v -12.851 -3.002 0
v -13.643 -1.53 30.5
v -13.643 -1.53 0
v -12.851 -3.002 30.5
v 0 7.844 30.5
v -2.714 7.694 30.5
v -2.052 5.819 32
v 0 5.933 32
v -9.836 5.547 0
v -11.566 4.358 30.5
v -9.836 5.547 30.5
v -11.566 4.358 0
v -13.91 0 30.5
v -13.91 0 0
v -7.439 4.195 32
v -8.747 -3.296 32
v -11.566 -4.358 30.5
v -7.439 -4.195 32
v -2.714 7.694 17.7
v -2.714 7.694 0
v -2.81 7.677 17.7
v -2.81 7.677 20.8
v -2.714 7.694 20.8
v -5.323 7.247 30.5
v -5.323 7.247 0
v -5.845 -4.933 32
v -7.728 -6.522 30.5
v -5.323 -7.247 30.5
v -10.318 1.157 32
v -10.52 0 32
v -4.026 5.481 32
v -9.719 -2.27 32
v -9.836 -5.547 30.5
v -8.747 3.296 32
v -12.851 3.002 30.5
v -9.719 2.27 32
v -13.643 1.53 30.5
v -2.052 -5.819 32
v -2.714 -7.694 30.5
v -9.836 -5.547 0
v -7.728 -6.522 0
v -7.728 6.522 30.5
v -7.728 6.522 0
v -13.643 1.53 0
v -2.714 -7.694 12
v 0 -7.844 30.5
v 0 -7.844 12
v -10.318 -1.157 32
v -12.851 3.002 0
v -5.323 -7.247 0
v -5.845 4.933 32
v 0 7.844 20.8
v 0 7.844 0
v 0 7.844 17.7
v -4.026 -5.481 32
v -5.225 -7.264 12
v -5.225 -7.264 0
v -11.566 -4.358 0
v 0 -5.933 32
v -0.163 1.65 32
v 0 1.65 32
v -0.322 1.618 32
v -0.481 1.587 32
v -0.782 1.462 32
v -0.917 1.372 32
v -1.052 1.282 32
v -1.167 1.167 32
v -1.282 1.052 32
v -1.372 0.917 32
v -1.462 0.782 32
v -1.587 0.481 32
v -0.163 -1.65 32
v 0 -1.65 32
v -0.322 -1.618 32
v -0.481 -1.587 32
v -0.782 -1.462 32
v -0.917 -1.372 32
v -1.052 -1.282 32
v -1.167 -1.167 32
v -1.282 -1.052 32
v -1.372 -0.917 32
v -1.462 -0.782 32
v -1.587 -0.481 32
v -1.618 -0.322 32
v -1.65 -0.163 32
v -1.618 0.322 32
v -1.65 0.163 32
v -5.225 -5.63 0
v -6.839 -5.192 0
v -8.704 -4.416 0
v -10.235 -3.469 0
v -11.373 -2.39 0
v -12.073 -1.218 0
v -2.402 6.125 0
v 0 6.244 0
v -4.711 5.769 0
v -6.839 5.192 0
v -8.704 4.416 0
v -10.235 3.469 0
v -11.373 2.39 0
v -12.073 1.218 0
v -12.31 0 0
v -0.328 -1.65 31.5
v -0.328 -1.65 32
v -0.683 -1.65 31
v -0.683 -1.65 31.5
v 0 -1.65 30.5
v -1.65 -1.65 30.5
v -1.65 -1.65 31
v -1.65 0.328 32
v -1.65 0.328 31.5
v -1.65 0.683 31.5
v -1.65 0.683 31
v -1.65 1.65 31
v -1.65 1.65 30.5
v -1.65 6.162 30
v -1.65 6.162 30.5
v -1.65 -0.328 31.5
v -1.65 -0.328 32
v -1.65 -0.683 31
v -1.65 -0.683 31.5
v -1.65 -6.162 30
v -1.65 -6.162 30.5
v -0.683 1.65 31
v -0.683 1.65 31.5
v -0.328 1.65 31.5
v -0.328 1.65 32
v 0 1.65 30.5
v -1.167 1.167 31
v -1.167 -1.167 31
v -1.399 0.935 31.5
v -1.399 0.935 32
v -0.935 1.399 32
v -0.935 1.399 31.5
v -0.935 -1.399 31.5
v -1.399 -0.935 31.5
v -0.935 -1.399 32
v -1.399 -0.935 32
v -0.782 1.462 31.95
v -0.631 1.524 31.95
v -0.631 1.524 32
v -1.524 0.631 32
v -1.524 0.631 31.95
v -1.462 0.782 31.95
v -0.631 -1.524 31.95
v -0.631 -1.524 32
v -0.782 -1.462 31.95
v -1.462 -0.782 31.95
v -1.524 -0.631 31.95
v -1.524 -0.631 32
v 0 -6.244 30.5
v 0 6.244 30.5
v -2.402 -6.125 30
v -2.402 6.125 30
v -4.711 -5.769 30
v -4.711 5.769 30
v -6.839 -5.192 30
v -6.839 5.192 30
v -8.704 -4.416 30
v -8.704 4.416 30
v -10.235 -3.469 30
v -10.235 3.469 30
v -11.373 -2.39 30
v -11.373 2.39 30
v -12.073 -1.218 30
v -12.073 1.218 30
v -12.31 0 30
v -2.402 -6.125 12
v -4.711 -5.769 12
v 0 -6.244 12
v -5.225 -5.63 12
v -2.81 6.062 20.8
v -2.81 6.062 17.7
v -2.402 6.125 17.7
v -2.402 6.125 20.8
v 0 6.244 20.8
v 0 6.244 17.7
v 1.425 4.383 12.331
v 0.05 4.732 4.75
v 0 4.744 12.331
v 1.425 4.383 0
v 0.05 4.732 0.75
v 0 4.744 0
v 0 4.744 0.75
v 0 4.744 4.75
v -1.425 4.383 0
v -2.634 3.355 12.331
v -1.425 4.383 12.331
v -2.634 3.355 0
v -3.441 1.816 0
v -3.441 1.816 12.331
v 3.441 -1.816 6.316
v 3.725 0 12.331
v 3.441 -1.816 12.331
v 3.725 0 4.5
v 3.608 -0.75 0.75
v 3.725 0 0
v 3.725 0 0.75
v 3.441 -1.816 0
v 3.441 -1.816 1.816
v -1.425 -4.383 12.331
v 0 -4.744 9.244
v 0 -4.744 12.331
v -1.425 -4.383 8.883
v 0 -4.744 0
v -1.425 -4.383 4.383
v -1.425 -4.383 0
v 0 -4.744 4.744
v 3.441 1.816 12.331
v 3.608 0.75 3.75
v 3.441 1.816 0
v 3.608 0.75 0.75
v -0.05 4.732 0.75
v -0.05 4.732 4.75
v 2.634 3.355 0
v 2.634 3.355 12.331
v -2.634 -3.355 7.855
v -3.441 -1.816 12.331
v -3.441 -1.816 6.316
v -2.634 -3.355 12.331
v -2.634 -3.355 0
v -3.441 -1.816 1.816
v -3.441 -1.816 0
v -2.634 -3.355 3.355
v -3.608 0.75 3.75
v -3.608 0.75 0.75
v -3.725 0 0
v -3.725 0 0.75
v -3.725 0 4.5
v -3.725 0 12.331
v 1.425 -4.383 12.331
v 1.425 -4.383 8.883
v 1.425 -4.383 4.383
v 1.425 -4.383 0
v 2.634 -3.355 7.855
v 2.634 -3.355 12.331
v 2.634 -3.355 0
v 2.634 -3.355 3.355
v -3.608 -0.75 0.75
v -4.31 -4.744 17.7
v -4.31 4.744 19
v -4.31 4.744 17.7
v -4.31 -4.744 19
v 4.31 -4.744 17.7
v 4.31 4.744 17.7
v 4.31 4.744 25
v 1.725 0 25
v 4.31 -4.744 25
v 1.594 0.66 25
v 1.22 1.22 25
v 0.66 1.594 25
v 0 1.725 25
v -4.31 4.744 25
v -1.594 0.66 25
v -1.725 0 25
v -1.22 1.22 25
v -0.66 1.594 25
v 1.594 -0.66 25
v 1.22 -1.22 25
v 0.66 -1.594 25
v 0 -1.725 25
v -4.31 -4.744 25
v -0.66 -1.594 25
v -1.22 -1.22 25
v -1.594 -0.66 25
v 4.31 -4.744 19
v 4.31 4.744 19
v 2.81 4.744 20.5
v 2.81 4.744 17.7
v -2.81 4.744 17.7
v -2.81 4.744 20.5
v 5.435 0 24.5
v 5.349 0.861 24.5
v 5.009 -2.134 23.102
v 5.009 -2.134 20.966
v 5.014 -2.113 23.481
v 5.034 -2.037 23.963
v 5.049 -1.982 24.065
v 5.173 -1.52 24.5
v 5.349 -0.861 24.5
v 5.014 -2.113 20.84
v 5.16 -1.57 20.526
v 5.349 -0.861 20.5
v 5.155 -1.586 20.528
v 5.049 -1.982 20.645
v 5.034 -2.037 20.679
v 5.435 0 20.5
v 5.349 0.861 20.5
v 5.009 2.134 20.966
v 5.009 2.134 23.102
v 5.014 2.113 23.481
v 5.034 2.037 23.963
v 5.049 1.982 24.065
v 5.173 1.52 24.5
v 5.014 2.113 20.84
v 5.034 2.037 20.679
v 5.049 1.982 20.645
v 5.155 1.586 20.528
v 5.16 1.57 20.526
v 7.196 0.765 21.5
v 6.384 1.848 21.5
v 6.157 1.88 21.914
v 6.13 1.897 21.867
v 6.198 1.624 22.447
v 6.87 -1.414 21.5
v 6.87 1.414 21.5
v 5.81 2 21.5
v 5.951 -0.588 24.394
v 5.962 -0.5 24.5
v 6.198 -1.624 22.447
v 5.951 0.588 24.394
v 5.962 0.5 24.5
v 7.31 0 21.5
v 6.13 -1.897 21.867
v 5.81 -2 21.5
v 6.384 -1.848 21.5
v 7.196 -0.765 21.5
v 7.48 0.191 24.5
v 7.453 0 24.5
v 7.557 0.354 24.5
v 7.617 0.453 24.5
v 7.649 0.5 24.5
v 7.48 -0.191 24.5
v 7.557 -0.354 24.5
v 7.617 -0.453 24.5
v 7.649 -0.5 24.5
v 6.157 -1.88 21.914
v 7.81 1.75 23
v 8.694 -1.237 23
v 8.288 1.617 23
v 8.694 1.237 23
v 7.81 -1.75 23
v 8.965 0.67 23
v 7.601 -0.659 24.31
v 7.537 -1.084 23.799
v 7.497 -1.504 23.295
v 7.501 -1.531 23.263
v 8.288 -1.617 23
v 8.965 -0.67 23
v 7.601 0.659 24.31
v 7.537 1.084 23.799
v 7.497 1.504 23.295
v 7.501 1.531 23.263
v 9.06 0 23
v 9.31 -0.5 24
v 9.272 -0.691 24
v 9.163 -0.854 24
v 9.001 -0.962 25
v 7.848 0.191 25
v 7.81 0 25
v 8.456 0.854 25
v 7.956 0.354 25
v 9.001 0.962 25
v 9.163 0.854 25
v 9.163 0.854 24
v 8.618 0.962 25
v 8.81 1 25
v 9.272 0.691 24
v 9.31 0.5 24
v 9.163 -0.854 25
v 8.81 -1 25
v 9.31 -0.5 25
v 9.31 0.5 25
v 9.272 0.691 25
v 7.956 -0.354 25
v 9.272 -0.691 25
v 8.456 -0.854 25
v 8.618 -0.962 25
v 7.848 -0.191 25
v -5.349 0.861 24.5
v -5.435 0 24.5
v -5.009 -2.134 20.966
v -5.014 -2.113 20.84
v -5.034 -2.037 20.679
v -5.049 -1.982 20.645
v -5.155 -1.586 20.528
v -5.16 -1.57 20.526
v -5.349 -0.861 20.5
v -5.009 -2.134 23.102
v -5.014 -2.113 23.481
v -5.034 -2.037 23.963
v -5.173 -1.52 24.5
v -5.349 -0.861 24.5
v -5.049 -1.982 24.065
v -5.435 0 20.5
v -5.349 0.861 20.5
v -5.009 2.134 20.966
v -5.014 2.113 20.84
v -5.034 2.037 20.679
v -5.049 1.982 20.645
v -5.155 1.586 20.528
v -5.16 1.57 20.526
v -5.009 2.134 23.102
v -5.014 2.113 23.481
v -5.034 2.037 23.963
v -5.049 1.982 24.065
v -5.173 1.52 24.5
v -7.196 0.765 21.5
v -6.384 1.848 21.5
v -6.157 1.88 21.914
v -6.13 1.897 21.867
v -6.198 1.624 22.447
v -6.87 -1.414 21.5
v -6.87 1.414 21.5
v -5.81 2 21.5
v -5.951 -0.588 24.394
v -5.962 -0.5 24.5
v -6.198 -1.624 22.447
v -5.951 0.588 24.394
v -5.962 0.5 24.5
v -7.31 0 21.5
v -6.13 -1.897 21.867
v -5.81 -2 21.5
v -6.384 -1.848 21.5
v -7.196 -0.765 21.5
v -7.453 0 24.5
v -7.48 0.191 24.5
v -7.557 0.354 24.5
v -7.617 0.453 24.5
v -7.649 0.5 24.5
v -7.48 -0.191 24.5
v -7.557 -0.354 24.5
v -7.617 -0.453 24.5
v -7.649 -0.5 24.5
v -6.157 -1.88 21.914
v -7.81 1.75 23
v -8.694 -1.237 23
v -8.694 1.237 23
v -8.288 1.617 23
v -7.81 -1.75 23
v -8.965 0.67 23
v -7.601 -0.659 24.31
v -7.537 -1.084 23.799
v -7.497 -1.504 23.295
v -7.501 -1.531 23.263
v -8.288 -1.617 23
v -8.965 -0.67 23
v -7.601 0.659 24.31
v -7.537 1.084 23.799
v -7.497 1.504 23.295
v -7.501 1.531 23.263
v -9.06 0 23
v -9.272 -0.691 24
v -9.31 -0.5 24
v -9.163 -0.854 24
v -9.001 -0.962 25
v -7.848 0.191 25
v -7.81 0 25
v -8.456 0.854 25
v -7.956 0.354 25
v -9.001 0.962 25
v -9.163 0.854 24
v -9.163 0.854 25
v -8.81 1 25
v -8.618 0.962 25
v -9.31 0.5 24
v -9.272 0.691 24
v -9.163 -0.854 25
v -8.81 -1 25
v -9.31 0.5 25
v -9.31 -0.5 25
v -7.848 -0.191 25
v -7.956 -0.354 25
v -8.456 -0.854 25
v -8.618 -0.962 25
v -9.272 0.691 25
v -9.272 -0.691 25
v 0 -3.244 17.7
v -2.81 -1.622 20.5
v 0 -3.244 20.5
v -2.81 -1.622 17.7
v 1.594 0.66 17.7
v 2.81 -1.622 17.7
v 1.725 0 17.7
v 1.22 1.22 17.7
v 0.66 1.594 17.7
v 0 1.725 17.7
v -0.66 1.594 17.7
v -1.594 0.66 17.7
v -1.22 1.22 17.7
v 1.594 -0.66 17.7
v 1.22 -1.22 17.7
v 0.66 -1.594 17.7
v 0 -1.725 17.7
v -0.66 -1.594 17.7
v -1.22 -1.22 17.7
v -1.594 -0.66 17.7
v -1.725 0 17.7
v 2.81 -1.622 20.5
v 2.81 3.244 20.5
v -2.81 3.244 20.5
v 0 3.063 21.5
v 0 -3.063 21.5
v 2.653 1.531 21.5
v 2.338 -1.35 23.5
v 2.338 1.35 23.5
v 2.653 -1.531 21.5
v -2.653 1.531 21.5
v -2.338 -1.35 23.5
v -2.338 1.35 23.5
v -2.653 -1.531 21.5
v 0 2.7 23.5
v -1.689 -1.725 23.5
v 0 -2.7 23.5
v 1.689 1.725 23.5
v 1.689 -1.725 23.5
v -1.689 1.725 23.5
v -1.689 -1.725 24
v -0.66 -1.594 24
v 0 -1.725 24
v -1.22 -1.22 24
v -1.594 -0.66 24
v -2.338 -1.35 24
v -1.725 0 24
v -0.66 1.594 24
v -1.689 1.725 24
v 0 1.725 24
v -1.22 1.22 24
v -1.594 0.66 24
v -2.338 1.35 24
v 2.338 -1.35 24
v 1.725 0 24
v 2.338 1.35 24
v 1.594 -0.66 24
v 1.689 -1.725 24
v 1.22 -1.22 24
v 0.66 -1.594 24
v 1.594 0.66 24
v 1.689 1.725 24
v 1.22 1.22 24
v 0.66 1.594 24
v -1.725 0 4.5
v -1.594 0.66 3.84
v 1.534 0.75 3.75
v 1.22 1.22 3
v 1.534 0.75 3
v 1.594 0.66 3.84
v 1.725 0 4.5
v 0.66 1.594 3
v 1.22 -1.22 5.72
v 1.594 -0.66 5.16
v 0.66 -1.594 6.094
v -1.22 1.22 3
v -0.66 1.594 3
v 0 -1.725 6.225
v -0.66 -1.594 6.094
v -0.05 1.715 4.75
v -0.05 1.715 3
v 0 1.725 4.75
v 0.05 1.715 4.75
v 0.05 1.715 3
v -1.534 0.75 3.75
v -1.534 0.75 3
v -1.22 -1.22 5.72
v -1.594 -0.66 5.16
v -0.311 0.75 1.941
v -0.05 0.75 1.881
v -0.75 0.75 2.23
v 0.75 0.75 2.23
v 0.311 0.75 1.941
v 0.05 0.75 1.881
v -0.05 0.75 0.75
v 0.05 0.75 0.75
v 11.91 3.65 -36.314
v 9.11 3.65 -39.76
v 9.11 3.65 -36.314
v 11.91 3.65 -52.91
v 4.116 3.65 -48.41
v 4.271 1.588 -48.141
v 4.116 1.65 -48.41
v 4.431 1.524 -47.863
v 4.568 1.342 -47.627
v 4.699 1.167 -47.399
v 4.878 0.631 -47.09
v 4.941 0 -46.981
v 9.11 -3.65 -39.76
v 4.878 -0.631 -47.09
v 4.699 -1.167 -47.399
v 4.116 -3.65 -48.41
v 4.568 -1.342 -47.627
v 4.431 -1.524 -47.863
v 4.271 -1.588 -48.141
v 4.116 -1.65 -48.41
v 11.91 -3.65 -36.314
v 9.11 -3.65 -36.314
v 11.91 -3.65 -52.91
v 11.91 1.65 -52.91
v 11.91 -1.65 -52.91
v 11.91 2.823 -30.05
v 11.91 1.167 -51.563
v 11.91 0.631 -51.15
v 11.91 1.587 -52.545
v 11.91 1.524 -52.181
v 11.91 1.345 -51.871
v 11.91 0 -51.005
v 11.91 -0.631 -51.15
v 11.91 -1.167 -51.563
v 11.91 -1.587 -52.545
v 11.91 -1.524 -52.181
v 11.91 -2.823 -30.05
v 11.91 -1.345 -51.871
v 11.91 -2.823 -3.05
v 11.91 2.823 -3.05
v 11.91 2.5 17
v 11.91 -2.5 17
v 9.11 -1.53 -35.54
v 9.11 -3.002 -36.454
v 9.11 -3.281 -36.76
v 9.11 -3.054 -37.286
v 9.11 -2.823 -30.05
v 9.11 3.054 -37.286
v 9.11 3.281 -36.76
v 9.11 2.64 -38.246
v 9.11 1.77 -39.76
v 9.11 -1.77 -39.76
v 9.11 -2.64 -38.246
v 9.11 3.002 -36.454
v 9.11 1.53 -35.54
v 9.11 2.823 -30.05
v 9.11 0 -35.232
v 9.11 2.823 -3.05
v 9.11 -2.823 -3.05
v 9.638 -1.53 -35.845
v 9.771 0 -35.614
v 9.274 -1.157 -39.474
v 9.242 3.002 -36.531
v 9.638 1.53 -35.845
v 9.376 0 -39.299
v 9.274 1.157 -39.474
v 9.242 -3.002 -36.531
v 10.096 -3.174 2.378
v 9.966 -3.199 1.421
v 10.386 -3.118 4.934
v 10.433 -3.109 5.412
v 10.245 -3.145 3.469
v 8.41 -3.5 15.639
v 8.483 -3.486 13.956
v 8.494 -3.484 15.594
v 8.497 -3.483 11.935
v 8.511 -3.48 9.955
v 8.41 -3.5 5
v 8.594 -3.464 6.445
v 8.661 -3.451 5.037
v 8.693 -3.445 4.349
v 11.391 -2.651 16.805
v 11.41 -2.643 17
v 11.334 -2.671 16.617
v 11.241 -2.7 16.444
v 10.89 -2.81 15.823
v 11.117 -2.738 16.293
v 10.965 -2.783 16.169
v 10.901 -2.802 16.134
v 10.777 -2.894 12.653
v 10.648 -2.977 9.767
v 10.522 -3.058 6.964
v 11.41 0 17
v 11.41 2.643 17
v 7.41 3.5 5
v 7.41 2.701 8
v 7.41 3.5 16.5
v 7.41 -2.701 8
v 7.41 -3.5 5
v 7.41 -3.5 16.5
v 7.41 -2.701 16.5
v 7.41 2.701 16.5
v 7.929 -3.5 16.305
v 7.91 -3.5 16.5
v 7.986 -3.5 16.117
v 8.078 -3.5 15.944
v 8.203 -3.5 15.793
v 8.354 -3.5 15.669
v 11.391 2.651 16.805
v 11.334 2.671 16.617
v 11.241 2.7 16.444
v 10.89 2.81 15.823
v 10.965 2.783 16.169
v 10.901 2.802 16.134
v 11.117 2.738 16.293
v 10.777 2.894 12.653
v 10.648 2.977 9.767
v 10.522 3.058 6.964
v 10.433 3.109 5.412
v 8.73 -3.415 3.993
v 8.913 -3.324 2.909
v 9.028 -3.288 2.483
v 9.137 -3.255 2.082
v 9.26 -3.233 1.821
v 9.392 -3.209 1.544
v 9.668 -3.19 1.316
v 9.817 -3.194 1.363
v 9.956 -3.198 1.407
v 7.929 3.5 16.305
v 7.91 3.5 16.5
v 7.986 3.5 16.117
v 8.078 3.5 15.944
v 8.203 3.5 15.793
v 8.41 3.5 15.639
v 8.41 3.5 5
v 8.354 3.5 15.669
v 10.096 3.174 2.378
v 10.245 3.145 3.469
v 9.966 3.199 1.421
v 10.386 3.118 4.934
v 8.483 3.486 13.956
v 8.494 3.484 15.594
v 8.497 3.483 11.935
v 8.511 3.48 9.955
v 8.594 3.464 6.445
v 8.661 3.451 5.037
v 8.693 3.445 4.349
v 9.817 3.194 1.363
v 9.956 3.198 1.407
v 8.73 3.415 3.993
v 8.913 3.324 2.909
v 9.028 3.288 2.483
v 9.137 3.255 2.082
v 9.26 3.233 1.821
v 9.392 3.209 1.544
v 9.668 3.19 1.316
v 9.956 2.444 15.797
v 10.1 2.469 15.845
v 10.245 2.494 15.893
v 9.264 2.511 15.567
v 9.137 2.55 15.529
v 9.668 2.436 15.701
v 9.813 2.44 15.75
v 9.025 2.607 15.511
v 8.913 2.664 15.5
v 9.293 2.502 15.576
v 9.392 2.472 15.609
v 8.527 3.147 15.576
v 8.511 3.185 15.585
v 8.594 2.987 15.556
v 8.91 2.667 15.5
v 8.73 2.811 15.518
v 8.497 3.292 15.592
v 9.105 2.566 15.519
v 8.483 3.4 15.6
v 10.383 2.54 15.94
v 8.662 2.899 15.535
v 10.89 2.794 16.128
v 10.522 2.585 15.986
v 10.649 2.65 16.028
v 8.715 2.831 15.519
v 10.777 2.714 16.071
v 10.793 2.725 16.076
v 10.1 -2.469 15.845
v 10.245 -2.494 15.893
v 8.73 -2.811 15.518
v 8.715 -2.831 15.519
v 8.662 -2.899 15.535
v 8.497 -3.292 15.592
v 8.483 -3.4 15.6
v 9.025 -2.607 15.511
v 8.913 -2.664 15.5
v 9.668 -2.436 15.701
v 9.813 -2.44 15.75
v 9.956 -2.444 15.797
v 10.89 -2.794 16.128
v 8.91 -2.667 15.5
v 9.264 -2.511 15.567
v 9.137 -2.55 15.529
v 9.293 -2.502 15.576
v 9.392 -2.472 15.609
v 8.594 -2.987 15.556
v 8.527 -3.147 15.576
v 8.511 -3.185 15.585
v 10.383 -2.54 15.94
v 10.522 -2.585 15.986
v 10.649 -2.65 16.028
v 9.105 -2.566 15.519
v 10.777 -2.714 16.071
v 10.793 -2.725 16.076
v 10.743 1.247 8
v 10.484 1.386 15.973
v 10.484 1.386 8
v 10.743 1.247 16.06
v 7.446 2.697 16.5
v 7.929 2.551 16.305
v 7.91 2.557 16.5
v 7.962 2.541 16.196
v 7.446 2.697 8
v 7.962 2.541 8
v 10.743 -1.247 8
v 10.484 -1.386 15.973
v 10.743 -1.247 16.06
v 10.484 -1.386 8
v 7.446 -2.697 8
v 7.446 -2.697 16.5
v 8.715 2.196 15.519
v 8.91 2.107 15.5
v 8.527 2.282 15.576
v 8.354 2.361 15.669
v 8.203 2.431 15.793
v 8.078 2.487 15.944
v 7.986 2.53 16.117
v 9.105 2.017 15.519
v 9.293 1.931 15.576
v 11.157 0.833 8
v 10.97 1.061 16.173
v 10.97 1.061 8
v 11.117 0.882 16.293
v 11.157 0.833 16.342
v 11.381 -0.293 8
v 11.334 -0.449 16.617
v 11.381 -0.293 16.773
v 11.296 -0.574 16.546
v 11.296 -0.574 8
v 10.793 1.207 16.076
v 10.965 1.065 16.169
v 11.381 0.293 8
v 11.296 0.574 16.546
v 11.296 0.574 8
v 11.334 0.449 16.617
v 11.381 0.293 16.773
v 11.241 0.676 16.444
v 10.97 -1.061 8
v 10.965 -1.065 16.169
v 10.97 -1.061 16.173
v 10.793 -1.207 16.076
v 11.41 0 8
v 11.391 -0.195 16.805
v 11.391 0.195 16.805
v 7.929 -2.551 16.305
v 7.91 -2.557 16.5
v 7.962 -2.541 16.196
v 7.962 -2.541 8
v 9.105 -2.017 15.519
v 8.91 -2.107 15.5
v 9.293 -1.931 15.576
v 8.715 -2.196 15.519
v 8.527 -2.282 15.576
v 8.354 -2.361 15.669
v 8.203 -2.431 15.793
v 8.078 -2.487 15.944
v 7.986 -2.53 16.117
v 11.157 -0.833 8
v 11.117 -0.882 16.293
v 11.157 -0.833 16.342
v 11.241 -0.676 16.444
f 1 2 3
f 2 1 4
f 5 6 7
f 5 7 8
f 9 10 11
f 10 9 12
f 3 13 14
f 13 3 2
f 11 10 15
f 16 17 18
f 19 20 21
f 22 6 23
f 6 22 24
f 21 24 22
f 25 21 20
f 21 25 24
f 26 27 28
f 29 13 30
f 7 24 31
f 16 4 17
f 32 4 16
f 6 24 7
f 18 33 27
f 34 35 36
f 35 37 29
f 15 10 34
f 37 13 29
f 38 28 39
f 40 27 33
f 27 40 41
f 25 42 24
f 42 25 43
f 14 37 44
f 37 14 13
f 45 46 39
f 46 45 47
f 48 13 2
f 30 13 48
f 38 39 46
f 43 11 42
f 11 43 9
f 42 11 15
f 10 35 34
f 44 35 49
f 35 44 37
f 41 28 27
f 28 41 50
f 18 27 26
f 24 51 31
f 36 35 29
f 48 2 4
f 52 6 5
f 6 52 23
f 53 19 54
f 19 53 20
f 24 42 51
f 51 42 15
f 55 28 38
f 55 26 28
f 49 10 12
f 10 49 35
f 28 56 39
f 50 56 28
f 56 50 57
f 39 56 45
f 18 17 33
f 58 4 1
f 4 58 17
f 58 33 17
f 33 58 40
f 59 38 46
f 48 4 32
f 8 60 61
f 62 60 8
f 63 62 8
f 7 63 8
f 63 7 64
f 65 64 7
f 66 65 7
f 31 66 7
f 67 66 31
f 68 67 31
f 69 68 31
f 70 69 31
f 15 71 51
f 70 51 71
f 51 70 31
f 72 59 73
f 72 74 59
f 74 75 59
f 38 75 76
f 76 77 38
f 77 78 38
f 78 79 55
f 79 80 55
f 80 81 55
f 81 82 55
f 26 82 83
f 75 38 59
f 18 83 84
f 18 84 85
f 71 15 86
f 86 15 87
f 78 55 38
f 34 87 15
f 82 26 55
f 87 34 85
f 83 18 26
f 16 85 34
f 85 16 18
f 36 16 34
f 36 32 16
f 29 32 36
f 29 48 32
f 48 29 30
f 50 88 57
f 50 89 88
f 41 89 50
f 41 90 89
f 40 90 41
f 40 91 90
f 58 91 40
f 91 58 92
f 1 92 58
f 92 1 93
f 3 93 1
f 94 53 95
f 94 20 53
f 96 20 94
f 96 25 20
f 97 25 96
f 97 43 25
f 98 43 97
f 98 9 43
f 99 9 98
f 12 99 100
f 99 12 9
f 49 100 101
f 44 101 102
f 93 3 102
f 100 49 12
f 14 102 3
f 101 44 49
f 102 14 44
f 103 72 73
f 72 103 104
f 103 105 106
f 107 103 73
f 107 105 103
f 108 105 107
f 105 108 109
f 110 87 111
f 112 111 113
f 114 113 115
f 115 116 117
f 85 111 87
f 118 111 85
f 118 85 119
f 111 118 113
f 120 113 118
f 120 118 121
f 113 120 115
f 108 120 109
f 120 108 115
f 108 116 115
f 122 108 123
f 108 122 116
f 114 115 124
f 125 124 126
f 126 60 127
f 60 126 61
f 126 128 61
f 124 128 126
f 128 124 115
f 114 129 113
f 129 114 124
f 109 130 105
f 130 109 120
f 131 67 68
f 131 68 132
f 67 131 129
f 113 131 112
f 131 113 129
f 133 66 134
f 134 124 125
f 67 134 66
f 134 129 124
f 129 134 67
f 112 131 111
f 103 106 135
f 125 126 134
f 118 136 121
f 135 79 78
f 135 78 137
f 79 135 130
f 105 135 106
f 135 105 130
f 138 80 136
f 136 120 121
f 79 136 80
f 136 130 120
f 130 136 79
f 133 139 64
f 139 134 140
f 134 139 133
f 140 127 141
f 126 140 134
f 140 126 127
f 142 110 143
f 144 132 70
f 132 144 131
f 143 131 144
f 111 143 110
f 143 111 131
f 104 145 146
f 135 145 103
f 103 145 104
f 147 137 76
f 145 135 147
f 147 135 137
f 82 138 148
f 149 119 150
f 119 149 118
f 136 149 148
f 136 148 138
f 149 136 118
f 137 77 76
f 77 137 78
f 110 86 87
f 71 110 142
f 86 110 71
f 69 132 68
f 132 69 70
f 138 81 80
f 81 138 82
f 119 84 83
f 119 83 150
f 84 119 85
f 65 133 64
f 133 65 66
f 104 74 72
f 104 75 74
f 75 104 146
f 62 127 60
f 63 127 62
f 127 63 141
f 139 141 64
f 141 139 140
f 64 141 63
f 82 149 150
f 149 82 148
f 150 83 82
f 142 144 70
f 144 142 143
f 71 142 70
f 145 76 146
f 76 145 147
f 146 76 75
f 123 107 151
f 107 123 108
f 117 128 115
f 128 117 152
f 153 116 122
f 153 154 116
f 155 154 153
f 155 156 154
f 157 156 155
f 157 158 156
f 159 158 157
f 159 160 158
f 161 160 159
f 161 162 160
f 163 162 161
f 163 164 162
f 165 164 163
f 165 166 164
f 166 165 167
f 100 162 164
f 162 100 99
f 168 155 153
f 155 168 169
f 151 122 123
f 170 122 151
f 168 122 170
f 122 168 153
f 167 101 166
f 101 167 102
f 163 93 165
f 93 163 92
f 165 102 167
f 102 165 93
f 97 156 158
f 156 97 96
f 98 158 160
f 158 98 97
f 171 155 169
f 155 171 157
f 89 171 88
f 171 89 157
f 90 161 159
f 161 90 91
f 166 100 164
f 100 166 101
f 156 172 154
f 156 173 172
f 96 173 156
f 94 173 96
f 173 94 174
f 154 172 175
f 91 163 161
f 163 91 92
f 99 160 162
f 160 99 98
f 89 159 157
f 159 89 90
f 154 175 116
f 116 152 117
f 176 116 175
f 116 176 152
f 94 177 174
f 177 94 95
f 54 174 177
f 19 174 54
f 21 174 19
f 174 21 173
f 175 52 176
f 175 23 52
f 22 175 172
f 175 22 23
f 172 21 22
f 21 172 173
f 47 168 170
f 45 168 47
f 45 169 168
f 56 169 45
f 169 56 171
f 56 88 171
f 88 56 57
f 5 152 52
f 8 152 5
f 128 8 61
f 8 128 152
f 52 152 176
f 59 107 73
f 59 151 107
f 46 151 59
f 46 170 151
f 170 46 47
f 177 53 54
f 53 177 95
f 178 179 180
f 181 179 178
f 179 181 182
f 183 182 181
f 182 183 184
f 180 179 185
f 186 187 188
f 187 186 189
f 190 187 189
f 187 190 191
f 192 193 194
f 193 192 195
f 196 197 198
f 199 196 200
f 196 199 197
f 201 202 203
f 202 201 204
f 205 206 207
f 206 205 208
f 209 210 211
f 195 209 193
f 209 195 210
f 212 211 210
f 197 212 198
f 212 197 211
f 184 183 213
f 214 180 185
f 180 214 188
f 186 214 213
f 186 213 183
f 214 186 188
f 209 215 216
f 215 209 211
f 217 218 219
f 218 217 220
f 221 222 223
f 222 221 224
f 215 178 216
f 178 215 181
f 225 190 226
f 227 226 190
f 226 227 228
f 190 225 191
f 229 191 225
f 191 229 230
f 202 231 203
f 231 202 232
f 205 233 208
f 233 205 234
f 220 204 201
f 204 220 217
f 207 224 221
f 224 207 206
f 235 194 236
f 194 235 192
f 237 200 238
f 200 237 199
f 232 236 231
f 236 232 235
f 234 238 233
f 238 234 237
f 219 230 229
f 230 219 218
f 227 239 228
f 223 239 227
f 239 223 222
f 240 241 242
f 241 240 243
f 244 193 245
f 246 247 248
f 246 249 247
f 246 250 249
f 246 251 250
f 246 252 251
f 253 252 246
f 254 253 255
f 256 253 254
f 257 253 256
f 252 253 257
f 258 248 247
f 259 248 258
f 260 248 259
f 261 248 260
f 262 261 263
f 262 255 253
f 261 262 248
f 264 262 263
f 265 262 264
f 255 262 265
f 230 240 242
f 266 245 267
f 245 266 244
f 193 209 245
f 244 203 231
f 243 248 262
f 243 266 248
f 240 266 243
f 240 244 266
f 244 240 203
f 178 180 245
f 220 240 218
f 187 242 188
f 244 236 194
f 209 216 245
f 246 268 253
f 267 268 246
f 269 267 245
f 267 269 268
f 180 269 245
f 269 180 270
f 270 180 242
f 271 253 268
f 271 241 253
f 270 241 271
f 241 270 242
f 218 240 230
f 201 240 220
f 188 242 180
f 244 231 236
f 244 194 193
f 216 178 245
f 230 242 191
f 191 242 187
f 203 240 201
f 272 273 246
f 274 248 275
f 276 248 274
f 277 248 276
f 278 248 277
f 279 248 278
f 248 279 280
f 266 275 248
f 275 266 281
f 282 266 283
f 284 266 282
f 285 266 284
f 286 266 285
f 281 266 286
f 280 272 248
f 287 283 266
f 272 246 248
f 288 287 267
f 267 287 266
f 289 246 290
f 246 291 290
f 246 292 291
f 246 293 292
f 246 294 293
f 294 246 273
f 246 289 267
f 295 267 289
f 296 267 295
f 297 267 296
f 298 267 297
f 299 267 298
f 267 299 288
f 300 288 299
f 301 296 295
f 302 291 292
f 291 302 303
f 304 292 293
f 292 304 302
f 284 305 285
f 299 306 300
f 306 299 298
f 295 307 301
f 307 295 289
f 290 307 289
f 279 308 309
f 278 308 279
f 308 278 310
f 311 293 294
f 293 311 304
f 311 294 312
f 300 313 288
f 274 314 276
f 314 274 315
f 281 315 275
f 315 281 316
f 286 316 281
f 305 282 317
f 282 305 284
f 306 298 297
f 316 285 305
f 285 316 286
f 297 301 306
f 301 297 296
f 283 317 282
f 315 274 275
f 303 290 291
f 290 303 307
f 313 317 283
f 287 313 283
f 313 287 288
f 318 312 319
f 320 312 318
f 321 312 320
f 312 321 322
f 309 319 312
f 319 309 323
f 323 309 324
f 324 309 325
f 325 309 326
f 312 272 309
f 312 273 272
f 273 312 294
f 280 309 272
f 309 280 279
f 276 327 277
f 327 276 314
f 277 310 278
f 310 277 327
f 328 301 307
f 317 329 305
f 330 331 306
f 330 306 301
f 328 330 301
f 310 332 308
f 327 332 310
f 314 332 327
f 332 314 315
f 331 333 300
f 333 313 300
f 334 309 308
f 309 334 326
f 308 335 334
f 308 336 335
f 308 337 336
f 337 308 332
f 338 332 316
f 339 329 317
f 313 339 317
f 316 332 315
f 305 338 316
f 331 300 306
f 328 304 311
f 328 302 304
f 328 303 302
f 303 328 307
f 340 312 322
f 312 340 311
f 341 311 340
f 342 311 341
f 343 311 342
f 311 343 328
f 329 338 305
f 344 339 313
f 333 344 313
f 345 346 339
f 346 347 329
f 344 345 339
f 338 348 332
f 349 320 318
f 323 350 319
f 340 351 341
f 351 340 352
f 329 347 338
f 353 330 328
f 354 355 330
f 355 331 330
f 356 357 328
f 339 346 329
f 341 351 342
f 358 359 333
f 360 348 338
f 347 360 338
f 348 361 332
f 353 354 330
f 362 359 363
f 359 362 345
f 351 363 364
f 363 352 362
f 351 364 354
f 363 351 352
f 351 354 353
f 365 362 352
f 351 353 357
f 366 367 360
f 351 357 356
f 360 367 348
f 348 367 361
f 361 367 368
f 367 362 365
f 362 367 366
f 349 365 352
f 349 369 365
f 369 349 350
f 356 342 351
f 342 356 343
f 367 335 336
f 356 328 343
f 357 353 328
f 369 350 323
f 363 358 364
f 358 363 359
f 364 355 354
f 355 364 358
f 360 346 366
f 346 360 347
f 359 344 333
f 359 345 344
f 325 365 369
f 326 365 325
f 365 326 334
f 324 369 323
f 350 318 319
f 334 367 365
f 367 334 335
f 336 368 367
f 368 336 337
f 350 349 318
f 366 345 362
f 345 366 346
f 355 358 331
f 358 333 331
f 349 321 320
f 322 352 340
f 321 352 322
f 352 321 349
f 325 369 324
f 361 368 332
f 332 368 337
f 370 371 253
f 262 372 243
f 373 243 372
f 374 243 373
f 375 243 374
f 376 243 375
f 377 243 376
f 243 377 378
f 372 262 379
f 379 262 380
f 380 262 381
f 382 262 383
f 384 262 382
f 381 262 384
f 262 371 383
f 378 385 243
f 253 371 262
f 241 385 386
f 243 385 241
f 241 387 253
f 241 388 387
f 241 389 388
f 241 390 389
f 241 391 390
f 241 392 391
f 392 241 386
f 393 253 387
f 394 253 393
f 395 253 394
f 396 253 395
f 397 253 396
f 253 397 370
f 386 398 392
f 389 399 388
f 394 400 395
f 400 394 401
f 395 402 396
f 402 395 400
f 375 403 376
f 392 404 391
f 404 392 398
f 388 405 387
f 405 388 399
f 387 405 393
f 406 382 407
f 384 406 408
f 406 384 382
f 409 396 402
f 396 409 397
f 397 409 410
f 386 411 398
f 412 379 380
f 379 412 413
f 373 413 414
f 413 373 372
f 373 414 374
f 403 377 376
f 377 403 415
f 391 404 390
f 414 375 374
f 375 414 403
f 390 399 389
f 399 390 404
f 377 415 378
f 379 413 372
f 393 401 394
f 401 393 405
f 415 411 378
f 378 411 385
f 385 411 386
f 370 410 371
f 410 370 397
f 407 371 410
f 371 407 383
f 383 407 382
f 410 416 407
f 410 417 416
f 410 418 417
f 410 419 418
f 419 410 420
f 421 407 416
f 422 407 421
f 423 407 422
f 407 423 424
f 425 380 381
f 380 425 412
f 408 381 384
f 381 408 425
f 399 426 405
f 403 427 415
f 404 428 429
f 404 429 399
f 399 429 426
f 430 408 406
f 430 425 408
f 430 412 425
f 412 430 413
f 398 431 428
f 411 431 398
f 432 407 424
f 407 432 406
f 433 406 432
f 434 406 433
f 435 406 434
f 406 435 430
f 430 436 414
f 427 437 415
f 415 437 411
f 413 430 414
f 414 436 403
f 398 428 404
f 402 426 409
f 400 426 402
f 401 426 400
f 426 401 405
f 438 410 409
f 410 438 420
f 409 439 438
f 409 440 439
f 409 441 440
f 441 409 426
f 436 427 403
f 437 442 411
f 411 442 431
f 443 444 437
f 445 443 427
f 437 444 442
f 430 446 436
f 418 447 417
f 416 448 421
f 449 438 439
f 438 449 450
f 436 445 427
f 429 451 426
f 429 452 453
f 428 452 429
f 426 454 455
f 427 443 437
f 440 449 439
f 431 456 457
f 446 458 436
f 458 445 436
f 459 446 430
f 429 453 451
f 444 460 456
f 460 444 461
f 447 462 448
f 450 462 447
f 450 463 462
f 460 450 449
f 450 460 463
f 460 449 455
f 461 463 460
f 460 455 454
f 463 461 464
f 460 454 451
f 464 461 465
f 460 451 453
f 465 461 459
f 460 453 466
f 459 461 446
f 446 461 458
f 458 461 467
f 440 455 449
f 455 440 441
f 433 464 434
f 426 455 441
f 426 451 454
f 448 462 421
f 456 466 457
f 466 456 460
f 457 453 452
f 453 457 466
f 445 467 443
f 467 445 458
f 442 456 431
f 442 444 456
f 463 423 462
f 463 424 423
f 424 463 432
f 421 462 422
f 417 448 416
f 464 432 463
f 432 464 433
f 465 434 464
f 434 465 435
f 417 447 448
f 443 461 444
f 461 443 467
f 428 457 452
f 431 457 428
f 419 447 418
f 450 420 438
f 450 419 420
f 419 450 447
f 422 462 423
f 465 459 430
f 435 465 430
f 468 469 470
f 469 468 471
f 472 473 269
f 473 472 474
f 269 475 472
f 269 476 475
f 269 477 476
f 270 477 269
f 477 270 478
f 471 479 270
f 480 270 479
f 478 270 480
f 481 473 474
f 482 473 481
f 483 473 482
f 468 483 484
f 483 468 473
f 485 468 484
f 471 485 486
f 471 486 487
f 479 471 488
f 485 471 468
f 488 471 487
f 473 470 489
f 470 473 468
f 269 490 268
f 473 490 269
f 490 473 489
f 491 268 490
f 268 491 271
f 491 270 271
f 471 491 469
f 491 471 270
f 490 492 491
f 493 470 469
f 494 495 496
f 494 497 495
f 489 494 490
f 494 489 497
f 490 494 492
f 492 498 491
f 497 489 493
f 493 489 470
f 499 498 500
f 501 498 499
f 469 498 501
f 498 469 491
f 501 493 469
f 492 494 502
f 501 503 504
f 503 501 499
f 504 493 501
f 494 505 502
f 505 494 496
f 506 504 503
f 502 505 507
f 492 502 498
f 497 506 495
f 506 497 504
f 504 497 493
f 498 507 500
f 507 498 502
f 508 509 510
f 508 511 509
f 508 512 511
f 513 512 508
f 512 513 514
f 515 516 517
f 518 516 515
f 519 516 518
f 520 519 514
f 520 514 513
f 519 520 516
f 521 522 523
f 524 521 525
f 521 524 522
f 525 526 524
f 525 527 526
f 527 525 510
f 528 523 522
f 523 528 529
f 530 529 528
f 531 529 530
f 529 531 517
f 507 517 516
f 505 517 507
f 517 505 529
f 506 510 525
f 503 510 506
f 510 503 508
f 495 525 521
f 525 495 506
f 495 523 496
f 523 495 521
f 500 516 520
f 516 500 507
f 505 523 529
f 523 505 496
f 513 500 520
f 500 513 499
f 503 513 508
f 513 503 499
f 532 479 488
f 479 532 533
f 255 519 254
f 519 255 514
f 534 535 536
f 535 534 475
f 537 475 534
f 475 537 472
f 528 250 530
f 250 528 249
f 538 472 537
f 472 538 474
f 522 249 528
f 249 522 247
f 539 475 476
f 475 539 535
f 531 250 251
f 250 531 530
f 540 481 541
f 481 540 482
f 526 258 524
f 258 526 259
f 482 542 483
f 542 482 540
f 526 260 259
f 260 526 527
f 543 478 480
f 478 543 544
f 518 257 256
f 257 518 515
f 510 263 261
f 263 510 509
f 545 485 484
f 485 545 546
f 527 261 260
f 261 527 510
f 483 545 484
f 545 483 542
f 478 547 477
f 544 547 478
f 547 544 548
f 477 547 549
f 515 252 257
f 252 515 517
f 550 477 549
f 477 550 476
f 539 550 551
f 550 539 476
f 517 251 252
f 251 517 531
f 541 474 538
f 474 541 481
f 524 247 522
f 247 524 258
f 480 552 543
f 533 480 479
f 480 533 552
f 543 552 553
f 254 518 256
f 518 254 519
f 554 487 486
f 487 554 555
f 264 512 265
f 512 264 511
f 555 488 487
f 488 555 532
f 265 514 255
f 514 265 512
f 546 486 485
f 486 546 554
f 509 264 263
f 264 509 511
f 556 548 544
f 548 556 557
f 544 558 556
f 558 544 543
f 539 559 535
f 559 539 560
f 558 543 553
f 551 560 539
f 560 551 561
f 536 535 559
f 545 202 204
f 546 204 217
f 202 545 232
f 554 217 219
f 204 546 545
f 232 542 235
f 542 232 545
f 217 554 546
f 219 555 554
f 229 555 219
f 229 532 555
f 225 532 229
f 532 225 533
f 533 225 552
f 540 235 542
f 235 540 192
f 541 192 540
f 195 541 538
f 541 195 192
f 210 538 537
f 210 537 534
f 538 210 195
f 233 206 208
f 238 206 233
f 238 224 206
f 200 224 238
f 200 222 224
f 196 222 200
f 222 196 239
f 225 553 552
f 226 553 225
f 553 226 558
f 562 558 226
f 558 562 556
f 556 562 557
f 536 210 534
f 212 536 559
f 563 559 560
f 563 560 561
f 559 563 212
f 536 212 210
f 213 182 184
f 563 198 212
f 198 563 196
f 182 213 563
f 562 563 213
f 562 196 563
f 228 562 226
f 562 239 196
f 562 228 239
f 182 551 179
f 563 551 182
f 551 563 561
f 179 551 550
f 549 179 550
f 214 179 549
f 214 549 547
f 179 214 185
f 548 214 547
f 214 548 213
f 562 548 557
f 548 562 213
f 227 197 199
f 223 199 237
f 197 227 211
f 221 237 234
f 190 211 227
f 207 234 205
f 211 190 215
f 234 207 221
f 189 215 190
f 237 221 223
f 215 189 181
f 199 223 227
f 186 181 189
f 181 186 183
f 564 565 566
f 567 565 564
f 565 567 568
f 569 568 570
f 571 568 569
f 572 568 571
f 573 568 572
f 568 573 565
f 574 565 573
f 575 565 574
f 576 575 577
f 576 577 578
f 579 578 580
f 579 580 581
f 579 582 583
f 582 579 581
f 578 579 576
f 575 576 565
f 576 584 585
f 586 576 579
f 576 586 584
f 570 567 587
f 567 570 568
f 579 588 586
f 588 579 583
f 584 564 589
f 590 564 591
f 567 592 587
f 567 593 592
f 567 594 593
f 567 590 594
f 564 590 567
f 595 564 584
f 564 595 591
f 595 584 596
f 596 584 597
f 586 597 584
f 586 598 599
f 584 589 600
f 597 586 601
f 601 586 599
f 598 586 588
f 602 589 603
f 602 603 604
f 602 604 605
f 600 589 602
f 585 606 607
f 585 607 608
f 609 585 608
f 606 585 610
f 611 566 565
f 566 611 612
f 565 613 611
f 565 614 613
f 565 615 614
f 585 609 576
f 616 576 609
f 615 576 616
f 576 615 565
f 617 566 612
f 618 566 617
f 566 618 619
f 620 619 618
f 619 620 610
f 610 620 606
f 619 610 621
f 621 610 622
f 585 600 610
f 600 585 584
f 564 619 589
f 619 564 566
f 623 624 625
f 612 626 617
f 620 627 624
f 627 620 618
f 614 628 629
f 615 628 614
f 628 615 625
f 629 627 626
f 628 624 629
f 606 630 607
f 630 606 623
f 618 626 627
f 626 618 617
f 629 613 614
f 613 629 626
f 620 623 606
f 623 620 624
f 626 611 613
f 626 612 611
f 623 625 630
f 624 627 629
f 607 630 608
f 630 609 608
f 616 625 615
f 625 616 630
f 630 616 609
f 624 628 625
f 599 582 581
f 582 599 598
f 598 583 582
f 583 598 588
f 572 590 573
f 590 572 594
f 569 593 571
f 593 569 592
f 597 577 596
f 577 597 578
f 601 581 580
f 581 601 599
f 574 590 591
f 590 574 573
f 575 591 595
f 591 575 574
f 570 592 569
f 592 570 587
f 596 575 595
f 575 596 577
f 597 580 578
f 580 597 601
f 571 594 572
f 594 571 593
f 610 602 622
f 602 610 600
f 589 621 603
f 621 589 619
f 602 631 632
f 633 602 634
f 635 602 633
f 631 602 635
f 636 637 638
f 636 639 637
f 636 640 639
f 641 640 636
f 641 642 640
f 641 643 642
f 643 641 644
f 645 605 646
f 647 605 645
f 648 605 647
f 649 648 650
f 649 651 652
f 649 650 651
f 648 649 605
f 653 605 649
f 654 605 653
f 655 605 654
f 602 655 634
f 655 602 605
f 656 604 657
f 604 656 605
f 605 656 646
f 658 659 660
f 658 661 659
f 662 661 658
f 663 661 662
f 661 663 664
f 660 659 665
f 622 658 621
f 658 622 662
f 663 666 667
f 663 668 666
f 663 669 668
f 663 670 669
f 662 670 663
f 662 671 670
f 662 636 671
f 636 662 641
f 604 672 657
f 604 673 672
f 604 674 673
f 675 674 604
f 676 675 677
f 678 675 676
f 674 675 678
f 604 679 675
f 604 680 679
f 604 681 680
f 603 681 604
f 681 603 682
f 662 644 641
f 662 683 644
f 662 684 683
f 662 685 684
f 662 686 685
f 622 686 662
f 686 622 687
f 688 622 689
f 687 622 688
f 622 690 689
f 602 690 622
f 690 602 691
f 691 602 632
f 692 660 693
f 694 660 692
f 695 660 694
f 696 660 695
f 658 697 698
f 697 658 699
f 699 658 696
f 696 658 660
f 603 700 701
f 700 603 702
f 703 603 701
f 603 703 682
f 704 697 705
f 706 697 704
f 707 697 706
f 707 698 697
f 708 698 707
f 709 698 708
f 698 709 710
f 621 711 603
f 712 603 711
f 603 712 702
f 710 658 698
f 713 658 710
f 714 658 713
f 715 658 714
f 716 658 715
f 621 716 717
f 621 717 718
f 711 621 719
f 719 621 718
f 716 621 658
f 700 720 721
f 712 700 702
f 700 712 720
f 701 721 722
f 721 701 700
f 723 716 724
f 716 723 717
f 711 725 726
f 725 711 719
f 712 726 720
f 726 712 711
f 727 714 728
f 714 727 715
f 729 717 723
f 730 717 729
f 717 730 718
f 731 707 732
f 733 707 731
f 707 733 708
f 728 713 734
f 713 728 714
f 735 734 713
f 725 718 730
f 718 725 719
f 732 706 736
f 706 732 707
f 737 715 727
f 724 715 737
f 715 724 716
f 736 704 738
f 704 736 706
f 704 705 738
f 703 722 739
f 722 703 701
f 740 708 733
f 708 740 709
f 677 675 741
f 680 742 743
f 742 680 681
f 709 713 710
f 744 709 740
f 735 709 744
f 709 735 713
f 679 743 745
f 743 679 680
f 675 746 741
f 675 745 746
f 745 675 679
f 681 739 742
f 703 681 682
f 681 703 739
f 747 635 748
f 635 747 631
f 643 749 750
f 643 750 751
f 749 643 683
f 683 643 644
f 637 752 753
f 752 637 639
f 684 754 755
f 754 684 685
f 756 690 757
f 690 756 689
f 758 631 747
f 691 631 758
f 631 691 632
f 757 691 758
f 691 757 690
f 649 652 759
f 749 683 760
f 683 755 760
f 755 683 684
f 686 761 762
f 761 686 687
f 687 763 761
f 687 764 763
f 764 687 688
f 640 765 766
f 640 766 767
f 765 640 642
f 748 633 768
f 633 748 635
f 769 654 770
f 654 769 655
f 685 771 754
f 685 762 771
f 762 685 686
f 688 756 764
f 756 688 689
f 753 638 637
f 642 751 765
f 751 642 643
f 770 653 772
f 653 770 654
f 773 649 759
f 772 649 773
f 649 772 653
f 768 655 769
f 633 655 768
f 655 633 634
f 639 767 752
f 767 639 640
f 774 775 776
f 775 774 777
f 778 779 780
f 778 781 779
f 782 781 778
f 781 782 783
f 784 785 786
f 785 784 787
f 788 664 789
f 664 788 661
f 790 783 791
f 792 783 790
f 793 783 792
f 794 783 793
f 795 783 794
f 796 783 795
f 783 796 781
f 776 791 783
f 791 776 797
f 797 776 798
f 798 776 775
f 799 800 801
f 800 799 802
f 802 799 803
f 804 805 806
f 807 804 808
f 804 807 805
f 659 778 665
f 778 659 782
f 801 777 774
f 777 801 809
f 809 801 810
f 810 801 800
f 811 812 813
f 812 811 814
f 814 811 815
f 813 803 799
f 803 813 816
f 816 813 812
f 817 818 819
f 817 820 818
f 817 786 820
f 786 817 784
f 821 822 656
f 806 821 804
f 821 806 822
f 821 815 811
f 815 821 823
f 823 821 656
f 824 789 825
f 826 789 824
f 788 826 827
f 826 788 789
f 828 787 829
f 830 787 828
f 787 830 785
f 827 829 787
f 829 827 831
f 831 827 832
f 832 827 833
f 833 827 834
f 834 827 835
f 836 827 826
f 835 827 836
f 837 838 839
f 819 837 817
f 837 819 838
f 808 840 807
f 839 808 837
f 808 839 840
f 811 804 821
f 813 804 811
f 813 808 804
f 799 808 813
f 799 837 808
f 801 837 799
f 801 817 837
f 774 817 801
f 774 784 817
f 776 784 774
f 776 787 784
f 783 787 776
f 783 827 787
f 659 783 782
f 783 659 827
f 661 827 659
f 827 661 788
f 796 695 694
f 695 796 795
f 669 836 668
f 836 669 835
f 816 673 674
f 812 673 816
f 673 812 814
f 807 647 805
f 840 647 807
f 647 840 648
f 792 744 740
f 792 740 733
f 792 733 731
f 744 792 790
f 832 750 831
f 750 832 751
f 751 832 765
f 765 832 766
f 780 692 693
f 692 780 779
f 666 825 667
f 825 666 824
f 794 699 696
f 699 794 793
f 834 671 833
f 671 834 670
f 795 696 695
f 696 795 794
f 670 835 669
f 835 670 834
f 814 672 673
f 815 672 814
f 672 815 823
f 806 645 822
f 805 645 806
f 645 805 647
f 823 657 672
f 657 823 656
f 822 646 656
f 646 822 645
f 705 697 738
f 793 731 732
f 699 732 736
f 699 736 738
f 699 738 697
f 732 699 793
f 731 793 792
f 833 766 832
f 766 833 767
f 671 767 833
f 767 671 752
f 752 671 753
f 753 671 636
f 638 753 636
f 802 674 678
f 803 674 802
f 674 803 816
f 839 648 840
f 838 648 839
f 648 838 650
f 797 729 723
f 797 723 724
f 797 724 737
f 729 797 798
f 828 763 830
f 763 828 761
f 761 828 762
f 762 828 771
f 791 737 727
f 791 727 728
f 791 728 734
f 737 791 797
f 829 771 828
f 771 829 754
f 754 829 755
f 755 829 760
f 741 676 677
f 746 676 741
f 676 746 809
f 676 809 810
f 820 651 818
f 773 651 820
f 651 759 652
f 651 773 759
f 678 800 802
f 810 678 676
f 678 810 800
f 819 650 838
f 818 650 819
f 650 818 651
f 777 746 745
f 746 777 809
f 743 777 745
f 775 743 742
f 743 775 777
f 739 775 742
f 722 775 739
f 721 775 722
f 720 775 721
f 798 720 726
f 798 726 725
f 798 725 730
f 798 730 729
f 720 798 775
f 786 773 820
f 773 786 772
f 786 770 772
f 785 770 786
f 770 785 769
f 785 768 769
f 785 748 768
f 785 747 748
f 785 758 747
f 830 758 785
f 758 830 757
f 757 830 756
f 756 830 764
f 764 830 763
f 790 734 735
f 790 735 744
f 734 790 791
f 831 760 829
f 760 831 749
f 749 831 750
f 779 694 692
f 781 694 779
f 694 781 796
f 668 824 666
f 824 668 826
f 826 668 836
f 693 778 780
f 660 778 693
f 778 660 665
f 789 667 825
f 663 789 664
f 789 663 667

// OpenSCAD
// file: ../microscope_parameters.scad
/******************************************************************
*                                                                 *
* OpenFlexure Microscope: Microscope Parameters                   *
*                                                                 *
* This is the top-level configuration file for the OpenFlexure    *
* microscope, an open microscope and 3-axis translation stage.    *
* It gets really good precision over a ~10mm range, by using      *
* plastic flexure mechanisms.                                     *
*                                                                 *
* Generally I've tried to put parts (or collections of closely    *
* related parts) in their own files.  However, all the parts      *
* depend on the geometry of the microscope - so these parameters  *
* are gathered together here.  In general, the ones you might     *
* to change are towards the top!  Lower-down ones are defined in  *
* terms of higher-up ones - confusion might arise if you redefine *
* these later...                                                  *
*                                                                 *
* (c) Richard Bowman, January 2016                                *
* Released under the CERN Open Hardware License                   *
*                                                                 *
* http://www.github.com/rwb27/openflexure_microscope              *
* http://www.docubricks.com/projects/openflexure-microscope       *
* http://www.waterscope.org                                       *
*                                                                 *
******************************************************************/

d = 0.05;
$fn=32;

// These are the most useful parameters to change!
big_stage = false;
motor_lugs = true;
version_numstring = "5.17.2";
camera = "picamera_2"; //see cameras/camera.scad for valid values
optics = big_stage?"rms_f40d16":"pilens"; //see optics.scad for valid values

// This sets the basic geometry of the microscope
sample_z = big_stage?65:40; // height of the top of the stage
leg_r = big_stage?30:25; // radius of innermost part of legs (stage size)
hole_r = big_stage?15:10; // size of hole in the stage
xy_lever_ratio = big_stage?4.0/7.0:1.0; // mechanical advantage of actuator over stage - can be used to trade speed and precision
z_lever_ratio = big_stage?2.4:2.6; // as above, for Z axis (must be >1)
// The variables below affect the position of the objective mount
z_strut_l = big_stage?20:15; //length of struts supporting Z carriage
objective_clip_y = big_stage?12:6; // y position of clip for optics
objective_clip_w = 10; // width of the dovetail clip for the optics
foot_height = 15; //height of the feet (distance from bottom of body to table)

// These variables set the dimensions of flexures
// You might want to tweak them if your material (or printer)
// is different from the ones I've tested, though ABS/PLA extrusion
// is generally fine with my parameters
stage_flex_w = 4; // width of XY axis flexures
zflex_l = 1.5;    // length of (all) flexible bits
zflex_t = 0.75;   // thickness of (all) flexible bits
zflex = [stage_flex_w, zflex_l, zflex_t]; // the above in new-style format
flex_a = 0.15;    // sine of the angle through which flexures can be bent

// Compile a sensible version string
version_string = str("v",version_numstring, big_stage?"-LS":"-SS", sample_z, motor_lugs?"-M":"");
echo(str("Compiling OpenFlexure Microscope ",version_string));

stage_t=5; //thickness of the XY stage (at thickest point, most is 1mm less)
flex_z1 = 0;      // z position of lower flexures for XY axis
flex_z2 = sample_z-stage_t; //height of upper XY flexures
z_strut_t = 6;  // (z) thickness of struts for Z axis
z_flex_w = 4;   // width of struts for Z axis
leg = [4,stage_flex_w,flex_z2+zflex_t]; // size of vertical legs
leg_middle_w = 12; // width of the middle part of each leg
actuator_h = 25; //height of the actuator columns
dz = 0.5; //small increment in Z (~ 2 layers)

leg_outer_w = leg_middle_w + 2*zflex_l + 2*leg[0]; // overall width of parallelogram legs that support the stagef
actuator = [3*1.2+2*2,(flex_z2 - flex_z1)*xy_lever_ratio,6]; // dimensions of the core part of the actuating levers for X and Y - NB should match the column_base_r in compact_nut_seat.scad
actuating_nut_r = (flex_z2 - flex_z1)*xy_lever_ratio; // distance from leg_r to the actuating nut/screw for the XY axes
xy_actuator_travel = actuating_nut_r*0.15; // distance moved by XY axis actuators
z_flexure_x = (leg_r-zflex_l-max(5,leg[2]*0.1))*sqrt(2); // x position of the outside of the Z-axis static anchors (either side of the XY stage, on the X axis)
z_flexure_spacing = min(flex_z2-actuator[2]-z_strut_l*0.22-2, 30); // distance between the two sets of flexures on the Z axis
z_carriage = [(z_flexure_x-zflex_l*2-z_strut_l)+d,4,z_flexure_spacing+zflex_t]; //size of the moving block for the Z carriage
z_nut_y = (z_strut_l+zflex_l)*z_lever_ratio+zflex_l/2; // position of Z actuator
z_actuator_travel = z_nut_y*0.15; // distance moved by the Z actuator
z_carriage_y = z_strut_l+2*zflex_l; // y position of moving pivot on Z axis
z_link_w = 4; // width of linking bar between top Z-axis flexure struts
bridge_dz = 10; // spacing between thin links on legs
base_t=1; // thickness of the flat base of the structure
wall_h=15; // height of the stiffening vertical(ish) walls
wall_t=2; //thickness of the stiffening walls
zawall_h = z_flexure_spacing - 5; //height of wall near Z anchor
zbwall_h = z_actuator_travel+z_strut_t+1+2; //height of bridge over Z lever
illumination_clip_y = (-(leg_r-zflex_l-wall_t/2+leg_outer_w/2)/sqrt(2)
                       -wall_t/2-1); //position of clip for
                      // illumination/back foot.  This is set to
                      // coincide with the wall between the back
                      // two legs.
illumination_arm_screws = [[0,illumination_clip_y+3,0],
                           [-z_flexure_x+3,-3,0],
                           [z_flexure_x-3,-3,0]];
                      // positions of screws that mount the adjustable version of the 
                      // illumination arm
condenser_clip_y = -8; //position of dovetail for condenser assembly
base_mounting_holes = [[-20,z_nut_y-4,0],[20,z_nut_y-4,0],[-z_flexure_x-4,-8,0],[z_flexure_x+4,-8,0]]; // holes to screw the microscope to a baseplate
// file: ../actuator_assembly_tools.scad
/*

Tools for assembling the OpenFlexure Microscope v5.16

(c) 2016 Richard Bowman - released under CERN Open Hardware License

*/

use <utilities.scad>;
use <compact_nut_seat.scad>;
include <microscope_parameters.scad>;

ns = nut_slot_size();
shaft_d = nut_size()*1.1;
gap = 9; //size of the gap between gear and screw seat
swing_a = 30; //angle through which the tool swings
sso = ss_outer(25); //outer size of screw seat
handle_w = shaft_d+4; //width of the "handle" part
handle_l = sso[0]/2+gap; //length of handle part


module tool_handle(){
    w = handle_w;
    difference(){
        sequential_hull(){
            rotate([-swing_a,0,0]) translate([-w/2,0,0]) cube([w,sso[0]/2,gap]);
            translate([-w/2,ns[2],0]) cube([w,d,ns[2]]);
            translate([-w/2,sso[0]/2*cos(swing_a)+gap*sin(swing_a),0]) cube([w,d,ns[2]]);
            translate([-ns[0]/2,handle_l,0]) cube([ns[0],d,ns[2]]);
        }
        //ground (or bottom of gear)
        mirror([0,0,1]) cylinder(r=999,h=999,$fn=4);
        //screw seat (in swung-in position)
        rotate([0,180-swing_a,-90]) translate([0,0,-(gap+sso[2]/2)]) screw_seat_shell(25);
        //screw
        rotate([-swing_a,0,0]) cylinder(d=shaft_d,h=999,center=true, $fn=16);
    }
}

module xz_slice(){
    //slice out just the part of something that sits in the XZ plane
    intersection(){
        cube([9999,2*d,9999],center=true);
        children();
    }
}

module nut_tool(){
    w = ns[0]-0.6; //width of tool tip (needs to fit through the slot that's ns[0] wide
    h = ns[2]-0.7; //height of tool tip (needs to fit through slot)
    l = 5+sso[1]/2+3;
    difference(){
        union(){
            translate([0,-handle_l,0]) tool_handle();
            sequential_hull(){
                xz_slice() translate([0,-handle_l,0]) tool_handle();
                translate([-w/2, 5, 0]) cube([w, d, h]);
                translate([-w/2, l, 0]) cube([w, d, h]);
            }
        }
        
        //nut 
        translate([0,l,-d])rotate(30)cylinder(r=nut_size()*1.15, h=999, $fn=6);
        translate([0,l-nut_size()*1.15+0.4,-d]) cylinder(r=1,h=999,$fn=12);
    }
}

module band_tool(){
    w = ns[0]-0.5; //width of tool tip
    h = 4.5; //height of tool tip (needs to fit through slot)
    l = sso[2]/2+foot_height+5;
    // presently, the hook on the actuator is a 1mm radius cylinder, centred
    // 3.5mm from the edge of the (elliptical) wall of the screw seat.
    difference(){
        union(){
            translate([0,-handle_l,0]) tool_handle();
            hull(){
                xz_slice() translate([0,-handle_l,0]) tool_handle();
                translate([0,l-20,0]) xz_slice() translate([0,-handle_l,0]) tool_handle();
            }
            hull(){
                translate([0,l-20,0])xz_slice() translate([0,-handle_l,0]) tool_handle();
                translate([-5/2, l-12,0]) cube([5,12,h]);
                translate([-7/2, l-12,h-1]) cube([7,12,1]);
            }
        }
        // slot at the end for band insertion
        hull(){
            translate([0,l,2]) rotate([90,0,0]) cylinder(r=1.5,h=18,center=true);
            translate([0,l,2+3]) rotate([90,0,0]) cylinder(r=2.75,h=18,center=true);
        }
        // V shaped end to grip elastic bands
        translate([0,l,0]) hull(){
            translate([0,0,1.5]) rotate([0,90,0]) cylinder(r=1,h=999,center=true);
            translate([0,-0.5,h-1.5]) rotate([0,90,0]) cylinder(r=1,h=999,center=true);
        }
        translate([-99,l-0.5,h-1.5]) cube(999);
        // squeeze the sides slightly
        reflect([1,0,0]){
            translate([-7/2,l,h/2-0.3]) rotate([90,15,-3]) scale([1.1,1.5,1]) cylinder(r=1,h=999,center=true);
        }
    }
}


band_tool();
//translate([10,0,0]) nut_tool();
// main file
/*

An illustration for the OpenFlexure Microscope; how to put the nut in

(c) 2016 Richard Bowman - released under CERN Open Hardware License

*/

use <../compact_nut_seat.scad>;
use <../utilities.scad>;
use <../actuator_assembly_tools.scad>;
include <../microscope_parameters.scad>;

difference(){
    screw_seat(25, motor_lugs=false);

    difference(){ //an example actuator rod
        translate([-3,-10,0]) cube([6,10,5]);
        actuator_end_cutout();
    }
    rotate([0,90,0]) cylinder(r=999,h=999,$fn=4); //cutaway one side
}
actuator_column(25, 0, join_to_casing=false);

translate([ss_outer(0)[0]/2-2, 0, -30]) rotate([90,0,-90]) band_tool();
